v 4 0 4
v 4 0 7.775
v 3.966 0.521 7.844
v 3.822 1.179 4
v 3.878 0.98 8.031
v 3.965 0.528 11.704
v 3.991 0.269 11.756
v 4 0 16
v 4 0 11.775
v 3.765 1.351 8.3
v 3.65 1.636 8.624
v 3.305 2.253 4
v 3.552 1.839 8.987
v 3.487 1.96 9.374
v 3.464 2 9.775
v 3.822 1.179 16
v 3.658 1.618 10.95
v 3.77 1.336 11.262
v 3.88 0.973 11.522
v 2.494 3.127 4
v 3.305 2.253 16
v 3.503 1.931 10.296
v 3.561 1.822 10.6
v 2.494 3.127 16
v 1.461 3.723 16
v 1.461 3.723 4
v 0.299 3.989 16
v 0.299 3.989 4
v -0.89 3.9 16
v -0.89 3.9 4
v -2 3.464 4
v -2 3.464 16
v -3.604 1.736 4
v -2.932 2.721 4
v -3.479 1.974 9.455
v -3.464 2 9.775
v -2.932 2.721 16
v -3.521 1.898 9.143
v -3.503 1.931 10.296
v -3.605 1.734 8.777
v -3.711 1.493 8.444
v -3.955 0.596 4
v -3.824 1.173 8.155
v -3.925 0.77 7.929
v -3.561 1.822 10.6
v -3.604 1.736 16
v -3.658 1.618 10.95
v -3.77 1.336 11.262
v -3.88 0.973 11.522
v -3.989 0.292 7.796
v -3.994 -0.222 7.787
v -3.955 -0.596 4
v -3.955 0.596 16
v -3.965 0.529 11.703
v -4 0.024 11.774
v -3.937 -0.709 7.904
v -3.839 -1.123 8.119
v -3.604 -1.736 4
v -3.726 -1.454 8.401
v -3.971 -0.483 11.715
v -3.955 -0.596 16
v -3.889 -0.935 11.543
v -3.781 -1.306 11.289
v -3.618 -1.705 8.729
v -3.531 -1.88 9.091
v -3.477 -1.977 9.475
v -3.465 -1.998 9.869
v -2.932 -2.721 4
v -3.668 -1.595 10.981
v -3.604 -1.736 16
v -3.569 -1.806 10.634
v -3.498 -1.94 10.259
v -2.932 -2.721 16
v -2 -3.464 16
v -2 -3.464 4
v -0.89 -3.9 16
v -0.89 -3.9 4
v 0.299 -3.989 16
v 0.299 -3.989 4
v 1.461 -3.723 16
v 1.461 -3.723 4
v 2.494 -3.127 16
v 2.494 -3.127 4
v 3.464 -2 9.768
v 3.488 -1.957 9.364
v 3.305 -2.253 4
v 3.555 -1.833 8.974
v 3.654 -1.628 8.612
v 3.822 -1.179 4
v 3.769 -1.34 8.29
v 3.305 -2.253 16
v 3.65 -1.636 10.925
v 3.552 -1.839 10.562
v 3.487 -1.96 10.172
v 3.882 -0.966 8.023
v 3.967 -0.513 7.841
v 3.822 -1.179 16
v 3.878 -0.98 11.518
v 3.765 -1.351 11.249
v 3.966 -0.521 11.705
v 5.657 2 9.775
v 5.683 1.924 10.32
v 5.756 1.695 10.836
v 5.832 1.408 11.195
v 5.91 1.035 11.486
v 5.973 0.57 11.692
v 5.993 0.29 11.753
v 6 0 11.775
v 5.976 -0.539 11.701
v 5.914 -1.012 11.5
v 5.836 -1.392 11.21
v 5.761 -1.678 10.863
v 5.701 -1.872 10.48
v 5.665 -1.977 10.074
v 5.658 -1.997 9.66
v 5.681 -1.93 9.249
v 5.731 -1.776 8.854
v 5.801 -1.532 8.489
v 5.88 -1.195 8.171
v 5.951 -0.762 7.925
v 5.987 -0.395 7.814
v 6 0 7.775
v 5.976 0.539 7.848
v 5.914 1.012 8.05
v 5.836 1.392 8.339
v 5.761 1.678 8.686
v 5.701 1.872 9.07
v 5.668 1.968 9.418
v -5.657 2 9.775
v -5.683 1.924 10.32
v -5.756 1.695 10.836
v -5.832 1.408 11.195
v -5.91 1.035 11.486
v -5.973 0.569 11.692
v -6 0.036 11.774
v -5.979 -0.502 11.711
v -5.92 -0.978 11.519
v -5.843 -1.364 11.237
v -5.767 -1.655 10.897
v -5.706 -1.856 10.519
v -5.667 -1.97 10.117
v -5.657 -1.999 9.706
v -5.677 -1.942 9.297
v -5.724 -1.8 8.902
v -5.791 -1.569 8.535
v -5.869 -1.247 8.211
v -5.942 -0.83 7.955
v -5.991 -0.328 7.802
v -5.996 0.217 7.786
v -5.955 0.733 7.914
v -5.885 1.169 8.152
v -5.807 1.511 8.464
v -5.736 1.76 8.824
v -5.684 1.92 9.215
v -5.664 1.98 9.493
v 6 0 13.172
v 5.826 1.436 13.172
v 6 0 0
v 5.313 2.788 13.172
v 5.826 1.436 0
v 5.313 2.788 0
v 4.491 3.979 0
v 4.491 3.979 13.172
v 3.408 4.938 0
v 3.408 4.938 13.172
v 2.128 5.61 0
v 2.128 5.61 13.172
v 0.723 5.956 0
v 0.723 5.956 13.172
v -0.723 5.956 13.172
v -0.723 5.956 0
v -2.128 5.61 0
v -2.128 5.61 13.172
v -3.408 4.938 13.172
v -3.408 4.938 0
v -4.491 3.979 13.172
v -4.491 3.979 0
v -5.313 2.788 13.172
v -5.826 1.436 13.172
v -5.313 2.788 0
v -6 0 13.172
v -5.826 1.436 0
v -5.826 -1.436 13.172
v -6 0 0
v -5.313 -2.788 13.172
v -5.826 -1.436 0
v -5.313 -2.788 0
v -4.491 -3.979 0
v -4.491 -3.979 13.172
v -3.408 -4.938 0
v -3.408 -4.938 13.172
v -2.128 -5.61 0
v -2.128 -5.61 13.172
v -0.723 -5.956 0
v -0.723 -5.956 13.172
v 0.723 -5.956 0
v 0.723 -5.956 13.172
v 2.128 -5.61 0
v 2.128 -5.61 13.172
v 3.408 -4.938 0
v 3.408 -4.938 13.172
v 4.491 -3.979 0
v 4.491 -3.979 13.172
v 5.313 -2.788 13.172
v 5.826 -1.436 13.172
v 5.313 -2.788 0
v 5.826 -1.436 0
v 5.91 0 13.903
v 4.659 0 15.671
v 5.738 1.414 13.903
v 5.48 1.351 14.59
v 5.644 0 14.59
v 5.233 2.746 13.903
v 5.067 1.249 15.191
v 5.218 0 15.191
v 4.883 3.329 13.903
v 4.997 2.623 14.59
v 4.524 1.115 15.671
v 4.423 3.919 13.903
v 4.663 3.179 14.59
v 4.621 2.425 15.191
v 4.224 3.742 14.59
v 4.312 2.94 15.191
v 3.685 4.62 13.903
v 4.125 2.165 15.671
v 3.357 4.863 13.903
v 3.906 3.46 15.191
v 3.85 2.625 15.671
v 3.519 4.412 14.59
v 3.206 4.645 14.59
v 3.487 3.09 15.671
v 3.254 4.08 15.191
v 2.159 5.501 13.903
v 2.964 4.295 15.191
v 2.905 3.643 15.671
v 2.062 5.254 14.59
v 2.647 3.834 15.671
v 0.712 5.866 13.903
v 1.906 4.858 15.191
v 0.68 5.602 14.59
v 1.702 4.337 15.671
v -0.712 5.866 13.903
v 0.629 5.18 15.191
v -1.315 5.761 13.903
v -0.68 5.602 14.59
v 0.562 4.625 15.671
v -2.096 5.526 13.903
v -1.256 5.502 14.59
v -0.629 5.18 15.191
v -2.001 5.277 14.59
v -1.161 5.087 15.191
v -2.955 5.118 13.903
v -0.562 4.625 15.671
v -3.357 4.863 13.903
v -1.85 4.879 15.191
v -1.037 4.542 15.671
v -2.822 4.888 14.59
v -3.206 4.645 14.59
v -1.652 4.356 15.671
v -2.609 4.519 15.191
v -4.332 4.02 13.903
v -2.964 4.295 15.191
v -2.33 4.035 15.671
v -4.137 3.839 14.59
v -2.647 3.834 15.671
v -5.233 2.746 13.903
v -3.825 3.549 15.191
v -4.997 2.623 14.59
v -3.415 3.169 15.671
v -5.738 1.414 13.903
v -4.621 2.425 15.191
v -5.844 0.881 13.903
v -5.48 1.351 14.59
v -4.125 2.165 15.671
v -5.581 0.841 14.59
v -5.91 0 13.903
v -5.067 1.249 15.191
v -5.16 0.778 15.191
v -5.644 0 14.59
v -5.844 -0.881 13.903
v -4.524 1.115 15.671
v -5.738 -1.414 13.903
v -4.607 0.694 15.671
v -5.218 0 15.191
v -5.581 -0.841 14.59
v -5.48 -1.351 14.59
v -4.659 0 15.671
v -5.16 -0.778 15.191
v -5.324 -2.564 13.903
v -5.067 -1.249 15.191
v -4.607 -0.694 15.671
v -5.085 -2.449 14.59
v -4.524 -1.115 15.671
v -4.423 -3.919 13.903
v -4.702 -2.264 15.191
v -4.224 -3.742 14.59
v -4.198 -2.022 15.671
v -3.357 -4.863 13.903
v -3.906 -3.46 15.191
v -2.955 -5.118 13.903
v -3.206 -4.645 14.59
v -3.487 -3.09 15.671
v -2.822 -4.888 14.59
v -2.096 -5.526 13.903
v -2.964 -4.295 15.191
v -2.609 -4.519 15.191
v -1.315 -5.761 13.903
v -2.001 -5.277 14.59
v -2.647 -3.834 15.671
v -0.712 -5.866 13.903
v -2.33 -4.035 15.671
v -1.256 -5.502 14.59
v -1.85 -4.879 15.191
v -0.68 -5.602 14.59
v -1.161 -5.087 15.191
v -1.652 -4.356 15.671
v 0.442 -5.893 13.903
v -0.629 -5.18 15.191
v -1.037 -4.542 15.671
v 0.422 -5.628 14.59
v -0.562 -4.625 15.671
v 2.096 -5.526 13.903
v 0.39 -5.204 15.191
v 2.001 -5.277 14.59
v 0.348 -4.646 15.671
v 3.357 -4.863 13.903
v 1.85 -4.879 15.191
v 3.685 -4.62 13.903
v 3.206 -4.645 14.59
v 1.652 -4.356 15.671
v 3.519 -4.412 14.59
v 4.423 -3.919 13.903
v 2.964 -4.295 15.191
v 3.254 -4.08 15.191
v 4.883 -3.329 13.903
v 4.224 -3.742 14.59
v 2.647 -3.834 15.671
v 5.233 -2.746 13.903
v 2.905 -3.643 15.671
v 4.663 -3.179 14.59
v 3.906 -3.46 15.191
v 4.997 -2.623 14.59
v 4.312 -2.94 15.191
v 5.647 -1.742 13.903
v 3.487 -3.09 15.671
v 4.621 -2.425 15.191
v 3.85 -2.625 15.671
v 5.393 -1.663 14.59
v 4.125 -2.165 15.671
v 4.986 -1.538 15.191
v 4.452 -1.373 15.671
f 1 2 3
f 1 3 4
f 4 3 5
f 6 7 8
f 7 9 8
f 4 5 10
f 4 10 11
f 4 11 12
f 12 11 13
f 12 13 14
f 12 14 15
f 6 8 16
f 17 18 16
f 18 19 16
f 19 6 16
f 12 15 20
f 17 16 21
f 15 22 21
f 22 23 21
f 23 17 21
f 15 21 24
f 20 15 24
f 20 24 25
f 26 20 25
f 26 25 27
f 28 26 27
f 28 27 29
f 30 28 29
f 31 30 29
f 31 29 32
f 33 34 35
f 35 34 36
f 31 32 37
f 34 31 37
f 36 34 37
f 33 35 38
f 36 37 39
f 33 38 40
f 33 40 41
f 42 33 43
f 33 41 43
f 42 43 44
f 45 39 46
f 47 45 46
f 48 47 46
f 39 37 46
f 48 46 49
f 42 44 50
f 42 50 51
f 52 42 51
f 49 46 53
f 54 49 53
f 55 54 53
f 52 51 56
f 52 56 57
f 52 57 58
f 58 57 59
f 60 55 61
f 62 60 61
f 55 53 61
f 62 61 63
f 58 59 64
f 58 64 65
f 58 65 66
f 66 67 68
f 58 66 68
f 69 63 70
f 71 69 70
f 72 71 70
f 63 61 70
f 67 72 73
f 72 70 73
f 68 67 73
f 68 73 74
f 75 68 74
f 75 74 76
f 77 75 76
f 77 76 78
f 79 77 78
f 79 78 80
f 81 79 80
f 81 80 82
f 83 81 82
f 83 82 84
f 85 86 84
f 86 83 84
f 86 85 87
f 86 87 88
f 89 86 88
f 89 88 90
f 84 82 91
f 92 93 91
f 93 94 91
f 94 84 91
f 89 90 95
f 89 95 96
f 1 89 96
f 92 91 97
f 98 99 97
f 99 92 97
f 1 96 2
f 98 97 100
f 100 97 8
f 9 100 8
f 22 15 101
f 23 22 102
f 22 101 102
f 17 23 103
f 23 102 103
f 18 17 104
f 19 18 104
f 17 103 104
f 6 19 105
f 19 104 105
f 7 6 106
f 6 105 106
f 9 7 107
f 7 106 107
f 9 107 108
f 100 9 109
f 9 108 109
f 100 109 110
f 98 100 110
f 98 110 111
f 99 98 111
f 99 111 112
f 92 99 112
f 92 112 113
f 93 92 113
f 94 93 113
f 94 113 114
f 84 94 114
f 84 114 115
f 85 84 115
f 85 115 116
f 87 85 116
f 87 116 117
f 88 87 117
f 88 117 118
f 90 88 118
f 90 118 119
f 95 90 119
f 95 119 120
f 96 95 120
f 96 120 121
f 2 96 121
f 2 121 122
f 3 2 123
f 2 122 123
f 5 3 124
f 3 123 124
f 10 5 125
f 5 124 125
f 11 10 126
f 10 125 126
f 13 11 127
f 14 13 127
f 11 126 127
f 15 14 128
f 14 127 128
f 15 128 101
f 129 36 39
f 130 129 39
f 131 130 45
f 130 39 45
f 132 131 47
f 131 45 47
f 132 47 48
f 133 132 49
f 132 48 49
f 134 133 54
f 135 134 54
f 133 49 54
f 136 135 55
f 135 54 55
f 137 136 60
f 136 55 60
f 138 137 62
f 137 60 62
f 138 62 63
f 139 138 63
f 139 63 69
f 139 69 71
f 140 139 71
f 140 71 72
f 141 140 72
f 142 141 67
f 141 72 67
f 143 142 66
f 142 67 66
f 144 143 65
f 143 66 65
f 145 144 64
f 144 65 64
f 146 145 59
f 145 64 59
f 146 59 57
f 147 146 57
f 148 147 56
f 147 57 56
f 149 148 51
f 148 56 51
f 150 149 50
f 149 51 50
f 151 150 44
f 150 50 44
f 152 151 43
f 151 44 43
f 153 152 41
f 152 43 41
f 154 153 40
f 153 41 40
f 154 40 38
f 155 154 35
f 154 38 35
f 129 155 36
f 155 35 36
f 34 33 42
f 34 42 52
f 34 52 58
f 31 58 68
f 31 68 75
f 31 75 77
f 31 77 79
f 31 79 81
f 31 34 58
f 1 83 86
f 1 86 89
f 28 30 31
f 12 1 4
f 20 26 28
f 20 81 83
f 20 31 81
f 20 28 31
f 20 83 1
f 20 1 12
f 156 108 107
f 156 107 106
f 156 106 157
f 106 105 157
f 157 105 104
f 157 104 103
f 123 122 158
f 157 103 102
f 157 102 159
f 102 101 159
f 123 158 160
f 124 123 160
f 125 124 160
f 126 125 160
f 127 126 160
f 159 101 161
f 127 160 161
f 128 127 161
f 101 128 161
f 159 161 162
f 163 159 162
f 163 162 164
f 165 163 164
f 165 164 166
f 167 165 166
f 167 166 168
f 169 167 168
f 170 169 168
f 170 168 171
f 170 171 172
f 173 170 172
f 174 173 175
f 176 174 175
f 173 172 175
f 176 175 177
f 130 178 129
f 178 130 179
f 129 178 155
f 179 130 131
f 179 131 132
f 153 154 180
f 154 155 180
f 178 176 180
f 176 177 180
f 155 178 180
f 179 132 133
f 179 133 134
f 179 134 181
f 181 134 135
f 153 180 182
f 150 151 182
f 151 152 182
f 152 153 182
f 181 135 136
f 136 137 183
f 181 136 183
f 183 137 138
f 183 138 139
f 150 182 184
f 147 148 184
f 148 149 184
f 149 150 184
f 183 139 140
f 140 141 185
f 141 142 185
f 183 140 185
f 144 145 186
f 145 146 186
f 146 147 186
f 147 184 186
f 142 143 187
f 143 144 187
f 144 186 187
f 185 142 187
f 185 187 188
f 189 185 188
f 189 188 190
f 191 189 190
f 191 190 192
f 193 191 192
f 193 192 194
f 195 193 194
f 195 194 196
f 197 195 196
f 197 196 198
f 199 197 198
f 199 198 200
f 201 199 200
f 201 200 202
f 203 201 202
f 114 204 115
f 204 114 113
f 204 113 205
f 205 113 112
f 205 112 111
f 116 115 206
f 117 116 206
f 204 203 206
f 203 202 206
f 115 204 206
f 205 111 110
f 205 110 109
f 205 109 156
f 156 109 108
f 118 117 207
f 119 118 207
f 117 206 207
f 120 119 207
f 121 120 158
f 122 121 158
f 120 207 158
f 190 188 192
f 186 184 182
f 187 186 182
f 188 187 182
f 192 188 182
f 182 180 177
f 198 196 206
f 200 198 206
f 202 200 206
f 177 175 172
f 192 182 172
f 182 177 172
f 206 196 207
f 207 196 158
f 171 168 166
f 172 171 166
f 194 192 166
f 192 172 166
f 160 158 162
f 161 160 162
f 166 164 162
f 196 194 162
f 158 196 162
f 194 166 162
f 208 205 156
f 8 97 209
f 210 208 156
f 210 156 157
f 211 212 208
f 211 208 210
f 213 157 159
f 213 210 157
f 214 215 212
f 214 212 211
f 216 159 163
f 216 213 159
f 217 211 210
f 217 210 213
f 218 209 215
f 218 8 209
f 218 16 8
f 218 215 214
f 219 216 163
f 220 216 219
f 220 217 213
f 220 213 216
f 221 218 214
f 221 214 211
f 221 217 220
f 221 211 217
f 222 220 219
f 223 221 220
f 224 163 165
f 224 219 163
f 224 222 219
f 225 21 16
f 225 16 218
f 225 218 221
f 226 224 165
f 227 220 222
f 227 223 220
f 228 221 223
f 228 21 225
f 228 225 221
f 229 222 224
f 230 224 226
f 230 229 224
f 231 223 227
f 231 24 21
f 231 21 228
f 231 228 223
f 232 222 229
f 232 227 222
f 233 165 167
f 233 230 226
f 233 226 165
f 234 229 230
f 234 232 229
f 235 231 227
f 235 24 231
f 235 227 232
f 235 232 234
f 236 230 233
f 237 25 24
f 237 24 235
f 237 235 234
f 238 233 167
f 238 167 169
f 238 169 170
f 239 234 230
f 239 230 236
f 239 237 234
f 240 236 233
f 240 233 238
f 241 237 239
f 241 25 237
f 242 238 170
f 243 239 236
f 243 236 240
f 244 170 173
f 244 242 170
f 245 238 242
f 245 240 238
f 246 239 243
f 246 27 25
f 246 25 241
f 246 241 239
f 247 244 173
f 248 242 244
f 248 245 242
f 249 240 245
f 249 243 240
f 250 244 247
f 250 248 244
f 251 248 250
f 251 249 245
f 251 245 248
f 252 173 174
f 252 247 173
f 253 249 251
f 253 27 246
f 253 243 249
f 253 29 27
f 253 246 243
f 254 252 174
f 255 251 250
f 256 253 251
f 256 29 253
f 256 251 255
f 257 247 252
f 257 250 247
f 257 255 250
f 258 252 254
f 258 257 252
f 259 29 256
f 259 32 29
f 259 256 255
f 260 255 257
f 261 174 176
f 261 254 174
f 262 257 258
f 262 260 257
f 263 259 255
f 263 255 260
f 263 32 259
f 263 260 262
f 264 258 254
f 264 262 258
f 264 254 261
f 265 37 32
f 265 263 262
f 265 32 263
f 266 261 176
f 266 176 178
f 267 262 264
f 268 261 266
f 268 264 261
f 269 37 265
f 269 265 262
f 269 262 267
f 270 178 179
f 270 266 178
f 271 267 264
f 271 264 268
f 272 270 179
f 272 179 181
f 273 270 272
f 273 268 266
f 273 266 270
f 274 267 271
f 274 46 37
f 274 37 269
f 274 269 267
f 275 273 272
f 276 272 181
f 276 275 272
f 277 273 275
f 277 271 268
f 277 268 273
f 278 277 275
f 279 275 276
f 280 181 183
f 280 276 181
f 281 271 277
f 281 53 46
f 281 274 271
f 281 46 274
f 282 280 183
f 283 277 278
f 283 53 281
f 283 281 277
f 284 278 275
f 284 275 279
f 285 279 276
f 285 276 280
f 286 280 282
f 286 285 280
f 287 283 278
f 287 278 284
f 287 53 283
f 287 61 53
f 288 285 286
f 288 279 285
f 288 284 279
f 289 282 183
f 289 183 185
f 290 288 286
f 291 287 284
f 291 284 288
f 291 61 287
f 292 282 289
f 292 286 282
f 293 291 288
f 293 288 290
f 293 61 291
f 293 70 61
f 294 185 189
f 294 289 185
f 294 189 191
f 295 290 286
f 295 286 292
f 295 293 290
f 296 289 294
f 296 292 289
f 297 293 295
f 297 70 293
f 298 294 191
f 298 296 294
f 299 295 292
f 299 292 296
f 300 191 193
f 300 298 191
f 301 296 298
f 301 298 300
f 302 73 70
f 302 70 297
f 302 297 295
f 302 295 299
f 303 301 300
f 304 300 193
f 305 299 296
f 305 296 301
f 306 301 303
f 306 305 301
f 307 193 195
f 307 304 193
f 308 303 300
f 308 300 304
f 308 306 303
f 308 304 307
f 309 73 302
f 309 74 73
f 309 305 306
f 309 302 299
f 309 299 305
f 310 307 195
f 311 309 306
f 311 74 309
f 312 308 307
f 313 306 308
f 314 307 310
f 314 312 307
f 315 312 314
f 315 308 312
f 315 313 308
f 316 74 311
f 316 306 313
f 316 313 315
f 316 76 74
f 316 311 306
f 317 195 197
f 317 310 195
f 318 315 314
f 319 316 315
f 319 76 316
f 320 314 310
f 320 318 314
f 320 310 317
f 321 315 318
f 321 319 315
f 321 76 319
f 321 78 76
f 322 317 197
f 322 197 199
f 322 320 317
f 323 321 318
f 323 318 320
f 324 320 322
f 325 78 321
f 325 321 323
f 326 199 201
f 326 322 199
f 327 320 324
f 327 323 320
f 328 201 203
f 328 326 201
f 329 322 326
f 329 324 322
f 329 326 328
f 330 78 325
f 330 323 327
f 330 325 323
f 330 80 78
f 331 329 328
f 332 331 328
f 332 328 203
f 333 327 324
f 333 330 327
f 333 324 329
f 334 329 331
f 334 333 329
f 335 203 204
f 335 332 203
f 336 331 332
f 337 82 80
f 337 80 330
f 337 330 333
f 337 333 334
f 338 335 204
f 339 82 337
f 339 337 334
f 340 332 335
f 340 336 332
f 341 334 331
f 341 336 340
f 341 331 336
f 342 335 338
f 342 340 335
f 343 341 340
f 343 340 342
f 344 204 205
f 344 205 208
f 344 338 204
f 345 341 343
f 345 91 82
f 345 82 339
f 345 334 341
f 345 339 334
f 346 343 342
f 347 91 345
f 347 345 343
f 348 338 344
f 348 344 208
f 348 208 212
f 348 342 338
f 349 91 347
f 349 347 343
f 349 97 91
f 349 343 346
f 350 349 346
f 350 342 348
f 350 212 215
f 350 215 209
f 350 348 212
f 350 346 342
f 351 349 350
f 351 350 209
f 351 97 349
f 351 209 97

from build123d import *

# Parameters (mm, degrees)
F0_R     = 6
F1_DEPTH = 16
F2_R     = 2
F3_DEPTH = 12.5
F4_R     = 4
F5_DEPTH = 12


# Not quite as in the source:
# - a fillet or chamfer that OpenCascade refuses, or shapes differently, is made with other operations: its cross-section is extruded or revolved along the edge and cut away or added


with BuildPart() as f1:
    # F0 (on Top) → F1 (new body)
    with BuildSketch(Plane.XY):
        Circle(F0_R)
    extrude(amount=F1_DEPTH)

    # F2 (on Right) → F3 (cut, symmetric)
    with BuildSketch(Plane.YZ):
        with Locations((0, 9.7745376602)):
            Circle(F2_R)
    extrude(amount=F3_DEPTH, both=True, mode=Mode.SUBTRACT)

    # F4 (on face) → F5 (cut)
    with BuildSketch(Plane.XY.offset(16)):
        Circle(F4_R)
    extrude(amount=-F5_DEPTH, mode=Mode.SUBTRACT)

    # F6: fillet of radius 3 on 1 edges, made by hand

    # F6_s1 → F6_t2 (revolve, cut)
    with BuildSketch(Plane.XZ):
        with BuildLine():
            ThreePointArc((6, 13.1715728753), (5.4494897428, 14.9036236828), (4, 16))
            Line((4, 16), (6, 16))
            Line((6, 16), (6, 13.1715728753))
        make_face()
    revolve(axis=Axis((0, 0, 16), (0, 0, 1)), mode=Mode.SUBTRACT)


solid = f1.part
